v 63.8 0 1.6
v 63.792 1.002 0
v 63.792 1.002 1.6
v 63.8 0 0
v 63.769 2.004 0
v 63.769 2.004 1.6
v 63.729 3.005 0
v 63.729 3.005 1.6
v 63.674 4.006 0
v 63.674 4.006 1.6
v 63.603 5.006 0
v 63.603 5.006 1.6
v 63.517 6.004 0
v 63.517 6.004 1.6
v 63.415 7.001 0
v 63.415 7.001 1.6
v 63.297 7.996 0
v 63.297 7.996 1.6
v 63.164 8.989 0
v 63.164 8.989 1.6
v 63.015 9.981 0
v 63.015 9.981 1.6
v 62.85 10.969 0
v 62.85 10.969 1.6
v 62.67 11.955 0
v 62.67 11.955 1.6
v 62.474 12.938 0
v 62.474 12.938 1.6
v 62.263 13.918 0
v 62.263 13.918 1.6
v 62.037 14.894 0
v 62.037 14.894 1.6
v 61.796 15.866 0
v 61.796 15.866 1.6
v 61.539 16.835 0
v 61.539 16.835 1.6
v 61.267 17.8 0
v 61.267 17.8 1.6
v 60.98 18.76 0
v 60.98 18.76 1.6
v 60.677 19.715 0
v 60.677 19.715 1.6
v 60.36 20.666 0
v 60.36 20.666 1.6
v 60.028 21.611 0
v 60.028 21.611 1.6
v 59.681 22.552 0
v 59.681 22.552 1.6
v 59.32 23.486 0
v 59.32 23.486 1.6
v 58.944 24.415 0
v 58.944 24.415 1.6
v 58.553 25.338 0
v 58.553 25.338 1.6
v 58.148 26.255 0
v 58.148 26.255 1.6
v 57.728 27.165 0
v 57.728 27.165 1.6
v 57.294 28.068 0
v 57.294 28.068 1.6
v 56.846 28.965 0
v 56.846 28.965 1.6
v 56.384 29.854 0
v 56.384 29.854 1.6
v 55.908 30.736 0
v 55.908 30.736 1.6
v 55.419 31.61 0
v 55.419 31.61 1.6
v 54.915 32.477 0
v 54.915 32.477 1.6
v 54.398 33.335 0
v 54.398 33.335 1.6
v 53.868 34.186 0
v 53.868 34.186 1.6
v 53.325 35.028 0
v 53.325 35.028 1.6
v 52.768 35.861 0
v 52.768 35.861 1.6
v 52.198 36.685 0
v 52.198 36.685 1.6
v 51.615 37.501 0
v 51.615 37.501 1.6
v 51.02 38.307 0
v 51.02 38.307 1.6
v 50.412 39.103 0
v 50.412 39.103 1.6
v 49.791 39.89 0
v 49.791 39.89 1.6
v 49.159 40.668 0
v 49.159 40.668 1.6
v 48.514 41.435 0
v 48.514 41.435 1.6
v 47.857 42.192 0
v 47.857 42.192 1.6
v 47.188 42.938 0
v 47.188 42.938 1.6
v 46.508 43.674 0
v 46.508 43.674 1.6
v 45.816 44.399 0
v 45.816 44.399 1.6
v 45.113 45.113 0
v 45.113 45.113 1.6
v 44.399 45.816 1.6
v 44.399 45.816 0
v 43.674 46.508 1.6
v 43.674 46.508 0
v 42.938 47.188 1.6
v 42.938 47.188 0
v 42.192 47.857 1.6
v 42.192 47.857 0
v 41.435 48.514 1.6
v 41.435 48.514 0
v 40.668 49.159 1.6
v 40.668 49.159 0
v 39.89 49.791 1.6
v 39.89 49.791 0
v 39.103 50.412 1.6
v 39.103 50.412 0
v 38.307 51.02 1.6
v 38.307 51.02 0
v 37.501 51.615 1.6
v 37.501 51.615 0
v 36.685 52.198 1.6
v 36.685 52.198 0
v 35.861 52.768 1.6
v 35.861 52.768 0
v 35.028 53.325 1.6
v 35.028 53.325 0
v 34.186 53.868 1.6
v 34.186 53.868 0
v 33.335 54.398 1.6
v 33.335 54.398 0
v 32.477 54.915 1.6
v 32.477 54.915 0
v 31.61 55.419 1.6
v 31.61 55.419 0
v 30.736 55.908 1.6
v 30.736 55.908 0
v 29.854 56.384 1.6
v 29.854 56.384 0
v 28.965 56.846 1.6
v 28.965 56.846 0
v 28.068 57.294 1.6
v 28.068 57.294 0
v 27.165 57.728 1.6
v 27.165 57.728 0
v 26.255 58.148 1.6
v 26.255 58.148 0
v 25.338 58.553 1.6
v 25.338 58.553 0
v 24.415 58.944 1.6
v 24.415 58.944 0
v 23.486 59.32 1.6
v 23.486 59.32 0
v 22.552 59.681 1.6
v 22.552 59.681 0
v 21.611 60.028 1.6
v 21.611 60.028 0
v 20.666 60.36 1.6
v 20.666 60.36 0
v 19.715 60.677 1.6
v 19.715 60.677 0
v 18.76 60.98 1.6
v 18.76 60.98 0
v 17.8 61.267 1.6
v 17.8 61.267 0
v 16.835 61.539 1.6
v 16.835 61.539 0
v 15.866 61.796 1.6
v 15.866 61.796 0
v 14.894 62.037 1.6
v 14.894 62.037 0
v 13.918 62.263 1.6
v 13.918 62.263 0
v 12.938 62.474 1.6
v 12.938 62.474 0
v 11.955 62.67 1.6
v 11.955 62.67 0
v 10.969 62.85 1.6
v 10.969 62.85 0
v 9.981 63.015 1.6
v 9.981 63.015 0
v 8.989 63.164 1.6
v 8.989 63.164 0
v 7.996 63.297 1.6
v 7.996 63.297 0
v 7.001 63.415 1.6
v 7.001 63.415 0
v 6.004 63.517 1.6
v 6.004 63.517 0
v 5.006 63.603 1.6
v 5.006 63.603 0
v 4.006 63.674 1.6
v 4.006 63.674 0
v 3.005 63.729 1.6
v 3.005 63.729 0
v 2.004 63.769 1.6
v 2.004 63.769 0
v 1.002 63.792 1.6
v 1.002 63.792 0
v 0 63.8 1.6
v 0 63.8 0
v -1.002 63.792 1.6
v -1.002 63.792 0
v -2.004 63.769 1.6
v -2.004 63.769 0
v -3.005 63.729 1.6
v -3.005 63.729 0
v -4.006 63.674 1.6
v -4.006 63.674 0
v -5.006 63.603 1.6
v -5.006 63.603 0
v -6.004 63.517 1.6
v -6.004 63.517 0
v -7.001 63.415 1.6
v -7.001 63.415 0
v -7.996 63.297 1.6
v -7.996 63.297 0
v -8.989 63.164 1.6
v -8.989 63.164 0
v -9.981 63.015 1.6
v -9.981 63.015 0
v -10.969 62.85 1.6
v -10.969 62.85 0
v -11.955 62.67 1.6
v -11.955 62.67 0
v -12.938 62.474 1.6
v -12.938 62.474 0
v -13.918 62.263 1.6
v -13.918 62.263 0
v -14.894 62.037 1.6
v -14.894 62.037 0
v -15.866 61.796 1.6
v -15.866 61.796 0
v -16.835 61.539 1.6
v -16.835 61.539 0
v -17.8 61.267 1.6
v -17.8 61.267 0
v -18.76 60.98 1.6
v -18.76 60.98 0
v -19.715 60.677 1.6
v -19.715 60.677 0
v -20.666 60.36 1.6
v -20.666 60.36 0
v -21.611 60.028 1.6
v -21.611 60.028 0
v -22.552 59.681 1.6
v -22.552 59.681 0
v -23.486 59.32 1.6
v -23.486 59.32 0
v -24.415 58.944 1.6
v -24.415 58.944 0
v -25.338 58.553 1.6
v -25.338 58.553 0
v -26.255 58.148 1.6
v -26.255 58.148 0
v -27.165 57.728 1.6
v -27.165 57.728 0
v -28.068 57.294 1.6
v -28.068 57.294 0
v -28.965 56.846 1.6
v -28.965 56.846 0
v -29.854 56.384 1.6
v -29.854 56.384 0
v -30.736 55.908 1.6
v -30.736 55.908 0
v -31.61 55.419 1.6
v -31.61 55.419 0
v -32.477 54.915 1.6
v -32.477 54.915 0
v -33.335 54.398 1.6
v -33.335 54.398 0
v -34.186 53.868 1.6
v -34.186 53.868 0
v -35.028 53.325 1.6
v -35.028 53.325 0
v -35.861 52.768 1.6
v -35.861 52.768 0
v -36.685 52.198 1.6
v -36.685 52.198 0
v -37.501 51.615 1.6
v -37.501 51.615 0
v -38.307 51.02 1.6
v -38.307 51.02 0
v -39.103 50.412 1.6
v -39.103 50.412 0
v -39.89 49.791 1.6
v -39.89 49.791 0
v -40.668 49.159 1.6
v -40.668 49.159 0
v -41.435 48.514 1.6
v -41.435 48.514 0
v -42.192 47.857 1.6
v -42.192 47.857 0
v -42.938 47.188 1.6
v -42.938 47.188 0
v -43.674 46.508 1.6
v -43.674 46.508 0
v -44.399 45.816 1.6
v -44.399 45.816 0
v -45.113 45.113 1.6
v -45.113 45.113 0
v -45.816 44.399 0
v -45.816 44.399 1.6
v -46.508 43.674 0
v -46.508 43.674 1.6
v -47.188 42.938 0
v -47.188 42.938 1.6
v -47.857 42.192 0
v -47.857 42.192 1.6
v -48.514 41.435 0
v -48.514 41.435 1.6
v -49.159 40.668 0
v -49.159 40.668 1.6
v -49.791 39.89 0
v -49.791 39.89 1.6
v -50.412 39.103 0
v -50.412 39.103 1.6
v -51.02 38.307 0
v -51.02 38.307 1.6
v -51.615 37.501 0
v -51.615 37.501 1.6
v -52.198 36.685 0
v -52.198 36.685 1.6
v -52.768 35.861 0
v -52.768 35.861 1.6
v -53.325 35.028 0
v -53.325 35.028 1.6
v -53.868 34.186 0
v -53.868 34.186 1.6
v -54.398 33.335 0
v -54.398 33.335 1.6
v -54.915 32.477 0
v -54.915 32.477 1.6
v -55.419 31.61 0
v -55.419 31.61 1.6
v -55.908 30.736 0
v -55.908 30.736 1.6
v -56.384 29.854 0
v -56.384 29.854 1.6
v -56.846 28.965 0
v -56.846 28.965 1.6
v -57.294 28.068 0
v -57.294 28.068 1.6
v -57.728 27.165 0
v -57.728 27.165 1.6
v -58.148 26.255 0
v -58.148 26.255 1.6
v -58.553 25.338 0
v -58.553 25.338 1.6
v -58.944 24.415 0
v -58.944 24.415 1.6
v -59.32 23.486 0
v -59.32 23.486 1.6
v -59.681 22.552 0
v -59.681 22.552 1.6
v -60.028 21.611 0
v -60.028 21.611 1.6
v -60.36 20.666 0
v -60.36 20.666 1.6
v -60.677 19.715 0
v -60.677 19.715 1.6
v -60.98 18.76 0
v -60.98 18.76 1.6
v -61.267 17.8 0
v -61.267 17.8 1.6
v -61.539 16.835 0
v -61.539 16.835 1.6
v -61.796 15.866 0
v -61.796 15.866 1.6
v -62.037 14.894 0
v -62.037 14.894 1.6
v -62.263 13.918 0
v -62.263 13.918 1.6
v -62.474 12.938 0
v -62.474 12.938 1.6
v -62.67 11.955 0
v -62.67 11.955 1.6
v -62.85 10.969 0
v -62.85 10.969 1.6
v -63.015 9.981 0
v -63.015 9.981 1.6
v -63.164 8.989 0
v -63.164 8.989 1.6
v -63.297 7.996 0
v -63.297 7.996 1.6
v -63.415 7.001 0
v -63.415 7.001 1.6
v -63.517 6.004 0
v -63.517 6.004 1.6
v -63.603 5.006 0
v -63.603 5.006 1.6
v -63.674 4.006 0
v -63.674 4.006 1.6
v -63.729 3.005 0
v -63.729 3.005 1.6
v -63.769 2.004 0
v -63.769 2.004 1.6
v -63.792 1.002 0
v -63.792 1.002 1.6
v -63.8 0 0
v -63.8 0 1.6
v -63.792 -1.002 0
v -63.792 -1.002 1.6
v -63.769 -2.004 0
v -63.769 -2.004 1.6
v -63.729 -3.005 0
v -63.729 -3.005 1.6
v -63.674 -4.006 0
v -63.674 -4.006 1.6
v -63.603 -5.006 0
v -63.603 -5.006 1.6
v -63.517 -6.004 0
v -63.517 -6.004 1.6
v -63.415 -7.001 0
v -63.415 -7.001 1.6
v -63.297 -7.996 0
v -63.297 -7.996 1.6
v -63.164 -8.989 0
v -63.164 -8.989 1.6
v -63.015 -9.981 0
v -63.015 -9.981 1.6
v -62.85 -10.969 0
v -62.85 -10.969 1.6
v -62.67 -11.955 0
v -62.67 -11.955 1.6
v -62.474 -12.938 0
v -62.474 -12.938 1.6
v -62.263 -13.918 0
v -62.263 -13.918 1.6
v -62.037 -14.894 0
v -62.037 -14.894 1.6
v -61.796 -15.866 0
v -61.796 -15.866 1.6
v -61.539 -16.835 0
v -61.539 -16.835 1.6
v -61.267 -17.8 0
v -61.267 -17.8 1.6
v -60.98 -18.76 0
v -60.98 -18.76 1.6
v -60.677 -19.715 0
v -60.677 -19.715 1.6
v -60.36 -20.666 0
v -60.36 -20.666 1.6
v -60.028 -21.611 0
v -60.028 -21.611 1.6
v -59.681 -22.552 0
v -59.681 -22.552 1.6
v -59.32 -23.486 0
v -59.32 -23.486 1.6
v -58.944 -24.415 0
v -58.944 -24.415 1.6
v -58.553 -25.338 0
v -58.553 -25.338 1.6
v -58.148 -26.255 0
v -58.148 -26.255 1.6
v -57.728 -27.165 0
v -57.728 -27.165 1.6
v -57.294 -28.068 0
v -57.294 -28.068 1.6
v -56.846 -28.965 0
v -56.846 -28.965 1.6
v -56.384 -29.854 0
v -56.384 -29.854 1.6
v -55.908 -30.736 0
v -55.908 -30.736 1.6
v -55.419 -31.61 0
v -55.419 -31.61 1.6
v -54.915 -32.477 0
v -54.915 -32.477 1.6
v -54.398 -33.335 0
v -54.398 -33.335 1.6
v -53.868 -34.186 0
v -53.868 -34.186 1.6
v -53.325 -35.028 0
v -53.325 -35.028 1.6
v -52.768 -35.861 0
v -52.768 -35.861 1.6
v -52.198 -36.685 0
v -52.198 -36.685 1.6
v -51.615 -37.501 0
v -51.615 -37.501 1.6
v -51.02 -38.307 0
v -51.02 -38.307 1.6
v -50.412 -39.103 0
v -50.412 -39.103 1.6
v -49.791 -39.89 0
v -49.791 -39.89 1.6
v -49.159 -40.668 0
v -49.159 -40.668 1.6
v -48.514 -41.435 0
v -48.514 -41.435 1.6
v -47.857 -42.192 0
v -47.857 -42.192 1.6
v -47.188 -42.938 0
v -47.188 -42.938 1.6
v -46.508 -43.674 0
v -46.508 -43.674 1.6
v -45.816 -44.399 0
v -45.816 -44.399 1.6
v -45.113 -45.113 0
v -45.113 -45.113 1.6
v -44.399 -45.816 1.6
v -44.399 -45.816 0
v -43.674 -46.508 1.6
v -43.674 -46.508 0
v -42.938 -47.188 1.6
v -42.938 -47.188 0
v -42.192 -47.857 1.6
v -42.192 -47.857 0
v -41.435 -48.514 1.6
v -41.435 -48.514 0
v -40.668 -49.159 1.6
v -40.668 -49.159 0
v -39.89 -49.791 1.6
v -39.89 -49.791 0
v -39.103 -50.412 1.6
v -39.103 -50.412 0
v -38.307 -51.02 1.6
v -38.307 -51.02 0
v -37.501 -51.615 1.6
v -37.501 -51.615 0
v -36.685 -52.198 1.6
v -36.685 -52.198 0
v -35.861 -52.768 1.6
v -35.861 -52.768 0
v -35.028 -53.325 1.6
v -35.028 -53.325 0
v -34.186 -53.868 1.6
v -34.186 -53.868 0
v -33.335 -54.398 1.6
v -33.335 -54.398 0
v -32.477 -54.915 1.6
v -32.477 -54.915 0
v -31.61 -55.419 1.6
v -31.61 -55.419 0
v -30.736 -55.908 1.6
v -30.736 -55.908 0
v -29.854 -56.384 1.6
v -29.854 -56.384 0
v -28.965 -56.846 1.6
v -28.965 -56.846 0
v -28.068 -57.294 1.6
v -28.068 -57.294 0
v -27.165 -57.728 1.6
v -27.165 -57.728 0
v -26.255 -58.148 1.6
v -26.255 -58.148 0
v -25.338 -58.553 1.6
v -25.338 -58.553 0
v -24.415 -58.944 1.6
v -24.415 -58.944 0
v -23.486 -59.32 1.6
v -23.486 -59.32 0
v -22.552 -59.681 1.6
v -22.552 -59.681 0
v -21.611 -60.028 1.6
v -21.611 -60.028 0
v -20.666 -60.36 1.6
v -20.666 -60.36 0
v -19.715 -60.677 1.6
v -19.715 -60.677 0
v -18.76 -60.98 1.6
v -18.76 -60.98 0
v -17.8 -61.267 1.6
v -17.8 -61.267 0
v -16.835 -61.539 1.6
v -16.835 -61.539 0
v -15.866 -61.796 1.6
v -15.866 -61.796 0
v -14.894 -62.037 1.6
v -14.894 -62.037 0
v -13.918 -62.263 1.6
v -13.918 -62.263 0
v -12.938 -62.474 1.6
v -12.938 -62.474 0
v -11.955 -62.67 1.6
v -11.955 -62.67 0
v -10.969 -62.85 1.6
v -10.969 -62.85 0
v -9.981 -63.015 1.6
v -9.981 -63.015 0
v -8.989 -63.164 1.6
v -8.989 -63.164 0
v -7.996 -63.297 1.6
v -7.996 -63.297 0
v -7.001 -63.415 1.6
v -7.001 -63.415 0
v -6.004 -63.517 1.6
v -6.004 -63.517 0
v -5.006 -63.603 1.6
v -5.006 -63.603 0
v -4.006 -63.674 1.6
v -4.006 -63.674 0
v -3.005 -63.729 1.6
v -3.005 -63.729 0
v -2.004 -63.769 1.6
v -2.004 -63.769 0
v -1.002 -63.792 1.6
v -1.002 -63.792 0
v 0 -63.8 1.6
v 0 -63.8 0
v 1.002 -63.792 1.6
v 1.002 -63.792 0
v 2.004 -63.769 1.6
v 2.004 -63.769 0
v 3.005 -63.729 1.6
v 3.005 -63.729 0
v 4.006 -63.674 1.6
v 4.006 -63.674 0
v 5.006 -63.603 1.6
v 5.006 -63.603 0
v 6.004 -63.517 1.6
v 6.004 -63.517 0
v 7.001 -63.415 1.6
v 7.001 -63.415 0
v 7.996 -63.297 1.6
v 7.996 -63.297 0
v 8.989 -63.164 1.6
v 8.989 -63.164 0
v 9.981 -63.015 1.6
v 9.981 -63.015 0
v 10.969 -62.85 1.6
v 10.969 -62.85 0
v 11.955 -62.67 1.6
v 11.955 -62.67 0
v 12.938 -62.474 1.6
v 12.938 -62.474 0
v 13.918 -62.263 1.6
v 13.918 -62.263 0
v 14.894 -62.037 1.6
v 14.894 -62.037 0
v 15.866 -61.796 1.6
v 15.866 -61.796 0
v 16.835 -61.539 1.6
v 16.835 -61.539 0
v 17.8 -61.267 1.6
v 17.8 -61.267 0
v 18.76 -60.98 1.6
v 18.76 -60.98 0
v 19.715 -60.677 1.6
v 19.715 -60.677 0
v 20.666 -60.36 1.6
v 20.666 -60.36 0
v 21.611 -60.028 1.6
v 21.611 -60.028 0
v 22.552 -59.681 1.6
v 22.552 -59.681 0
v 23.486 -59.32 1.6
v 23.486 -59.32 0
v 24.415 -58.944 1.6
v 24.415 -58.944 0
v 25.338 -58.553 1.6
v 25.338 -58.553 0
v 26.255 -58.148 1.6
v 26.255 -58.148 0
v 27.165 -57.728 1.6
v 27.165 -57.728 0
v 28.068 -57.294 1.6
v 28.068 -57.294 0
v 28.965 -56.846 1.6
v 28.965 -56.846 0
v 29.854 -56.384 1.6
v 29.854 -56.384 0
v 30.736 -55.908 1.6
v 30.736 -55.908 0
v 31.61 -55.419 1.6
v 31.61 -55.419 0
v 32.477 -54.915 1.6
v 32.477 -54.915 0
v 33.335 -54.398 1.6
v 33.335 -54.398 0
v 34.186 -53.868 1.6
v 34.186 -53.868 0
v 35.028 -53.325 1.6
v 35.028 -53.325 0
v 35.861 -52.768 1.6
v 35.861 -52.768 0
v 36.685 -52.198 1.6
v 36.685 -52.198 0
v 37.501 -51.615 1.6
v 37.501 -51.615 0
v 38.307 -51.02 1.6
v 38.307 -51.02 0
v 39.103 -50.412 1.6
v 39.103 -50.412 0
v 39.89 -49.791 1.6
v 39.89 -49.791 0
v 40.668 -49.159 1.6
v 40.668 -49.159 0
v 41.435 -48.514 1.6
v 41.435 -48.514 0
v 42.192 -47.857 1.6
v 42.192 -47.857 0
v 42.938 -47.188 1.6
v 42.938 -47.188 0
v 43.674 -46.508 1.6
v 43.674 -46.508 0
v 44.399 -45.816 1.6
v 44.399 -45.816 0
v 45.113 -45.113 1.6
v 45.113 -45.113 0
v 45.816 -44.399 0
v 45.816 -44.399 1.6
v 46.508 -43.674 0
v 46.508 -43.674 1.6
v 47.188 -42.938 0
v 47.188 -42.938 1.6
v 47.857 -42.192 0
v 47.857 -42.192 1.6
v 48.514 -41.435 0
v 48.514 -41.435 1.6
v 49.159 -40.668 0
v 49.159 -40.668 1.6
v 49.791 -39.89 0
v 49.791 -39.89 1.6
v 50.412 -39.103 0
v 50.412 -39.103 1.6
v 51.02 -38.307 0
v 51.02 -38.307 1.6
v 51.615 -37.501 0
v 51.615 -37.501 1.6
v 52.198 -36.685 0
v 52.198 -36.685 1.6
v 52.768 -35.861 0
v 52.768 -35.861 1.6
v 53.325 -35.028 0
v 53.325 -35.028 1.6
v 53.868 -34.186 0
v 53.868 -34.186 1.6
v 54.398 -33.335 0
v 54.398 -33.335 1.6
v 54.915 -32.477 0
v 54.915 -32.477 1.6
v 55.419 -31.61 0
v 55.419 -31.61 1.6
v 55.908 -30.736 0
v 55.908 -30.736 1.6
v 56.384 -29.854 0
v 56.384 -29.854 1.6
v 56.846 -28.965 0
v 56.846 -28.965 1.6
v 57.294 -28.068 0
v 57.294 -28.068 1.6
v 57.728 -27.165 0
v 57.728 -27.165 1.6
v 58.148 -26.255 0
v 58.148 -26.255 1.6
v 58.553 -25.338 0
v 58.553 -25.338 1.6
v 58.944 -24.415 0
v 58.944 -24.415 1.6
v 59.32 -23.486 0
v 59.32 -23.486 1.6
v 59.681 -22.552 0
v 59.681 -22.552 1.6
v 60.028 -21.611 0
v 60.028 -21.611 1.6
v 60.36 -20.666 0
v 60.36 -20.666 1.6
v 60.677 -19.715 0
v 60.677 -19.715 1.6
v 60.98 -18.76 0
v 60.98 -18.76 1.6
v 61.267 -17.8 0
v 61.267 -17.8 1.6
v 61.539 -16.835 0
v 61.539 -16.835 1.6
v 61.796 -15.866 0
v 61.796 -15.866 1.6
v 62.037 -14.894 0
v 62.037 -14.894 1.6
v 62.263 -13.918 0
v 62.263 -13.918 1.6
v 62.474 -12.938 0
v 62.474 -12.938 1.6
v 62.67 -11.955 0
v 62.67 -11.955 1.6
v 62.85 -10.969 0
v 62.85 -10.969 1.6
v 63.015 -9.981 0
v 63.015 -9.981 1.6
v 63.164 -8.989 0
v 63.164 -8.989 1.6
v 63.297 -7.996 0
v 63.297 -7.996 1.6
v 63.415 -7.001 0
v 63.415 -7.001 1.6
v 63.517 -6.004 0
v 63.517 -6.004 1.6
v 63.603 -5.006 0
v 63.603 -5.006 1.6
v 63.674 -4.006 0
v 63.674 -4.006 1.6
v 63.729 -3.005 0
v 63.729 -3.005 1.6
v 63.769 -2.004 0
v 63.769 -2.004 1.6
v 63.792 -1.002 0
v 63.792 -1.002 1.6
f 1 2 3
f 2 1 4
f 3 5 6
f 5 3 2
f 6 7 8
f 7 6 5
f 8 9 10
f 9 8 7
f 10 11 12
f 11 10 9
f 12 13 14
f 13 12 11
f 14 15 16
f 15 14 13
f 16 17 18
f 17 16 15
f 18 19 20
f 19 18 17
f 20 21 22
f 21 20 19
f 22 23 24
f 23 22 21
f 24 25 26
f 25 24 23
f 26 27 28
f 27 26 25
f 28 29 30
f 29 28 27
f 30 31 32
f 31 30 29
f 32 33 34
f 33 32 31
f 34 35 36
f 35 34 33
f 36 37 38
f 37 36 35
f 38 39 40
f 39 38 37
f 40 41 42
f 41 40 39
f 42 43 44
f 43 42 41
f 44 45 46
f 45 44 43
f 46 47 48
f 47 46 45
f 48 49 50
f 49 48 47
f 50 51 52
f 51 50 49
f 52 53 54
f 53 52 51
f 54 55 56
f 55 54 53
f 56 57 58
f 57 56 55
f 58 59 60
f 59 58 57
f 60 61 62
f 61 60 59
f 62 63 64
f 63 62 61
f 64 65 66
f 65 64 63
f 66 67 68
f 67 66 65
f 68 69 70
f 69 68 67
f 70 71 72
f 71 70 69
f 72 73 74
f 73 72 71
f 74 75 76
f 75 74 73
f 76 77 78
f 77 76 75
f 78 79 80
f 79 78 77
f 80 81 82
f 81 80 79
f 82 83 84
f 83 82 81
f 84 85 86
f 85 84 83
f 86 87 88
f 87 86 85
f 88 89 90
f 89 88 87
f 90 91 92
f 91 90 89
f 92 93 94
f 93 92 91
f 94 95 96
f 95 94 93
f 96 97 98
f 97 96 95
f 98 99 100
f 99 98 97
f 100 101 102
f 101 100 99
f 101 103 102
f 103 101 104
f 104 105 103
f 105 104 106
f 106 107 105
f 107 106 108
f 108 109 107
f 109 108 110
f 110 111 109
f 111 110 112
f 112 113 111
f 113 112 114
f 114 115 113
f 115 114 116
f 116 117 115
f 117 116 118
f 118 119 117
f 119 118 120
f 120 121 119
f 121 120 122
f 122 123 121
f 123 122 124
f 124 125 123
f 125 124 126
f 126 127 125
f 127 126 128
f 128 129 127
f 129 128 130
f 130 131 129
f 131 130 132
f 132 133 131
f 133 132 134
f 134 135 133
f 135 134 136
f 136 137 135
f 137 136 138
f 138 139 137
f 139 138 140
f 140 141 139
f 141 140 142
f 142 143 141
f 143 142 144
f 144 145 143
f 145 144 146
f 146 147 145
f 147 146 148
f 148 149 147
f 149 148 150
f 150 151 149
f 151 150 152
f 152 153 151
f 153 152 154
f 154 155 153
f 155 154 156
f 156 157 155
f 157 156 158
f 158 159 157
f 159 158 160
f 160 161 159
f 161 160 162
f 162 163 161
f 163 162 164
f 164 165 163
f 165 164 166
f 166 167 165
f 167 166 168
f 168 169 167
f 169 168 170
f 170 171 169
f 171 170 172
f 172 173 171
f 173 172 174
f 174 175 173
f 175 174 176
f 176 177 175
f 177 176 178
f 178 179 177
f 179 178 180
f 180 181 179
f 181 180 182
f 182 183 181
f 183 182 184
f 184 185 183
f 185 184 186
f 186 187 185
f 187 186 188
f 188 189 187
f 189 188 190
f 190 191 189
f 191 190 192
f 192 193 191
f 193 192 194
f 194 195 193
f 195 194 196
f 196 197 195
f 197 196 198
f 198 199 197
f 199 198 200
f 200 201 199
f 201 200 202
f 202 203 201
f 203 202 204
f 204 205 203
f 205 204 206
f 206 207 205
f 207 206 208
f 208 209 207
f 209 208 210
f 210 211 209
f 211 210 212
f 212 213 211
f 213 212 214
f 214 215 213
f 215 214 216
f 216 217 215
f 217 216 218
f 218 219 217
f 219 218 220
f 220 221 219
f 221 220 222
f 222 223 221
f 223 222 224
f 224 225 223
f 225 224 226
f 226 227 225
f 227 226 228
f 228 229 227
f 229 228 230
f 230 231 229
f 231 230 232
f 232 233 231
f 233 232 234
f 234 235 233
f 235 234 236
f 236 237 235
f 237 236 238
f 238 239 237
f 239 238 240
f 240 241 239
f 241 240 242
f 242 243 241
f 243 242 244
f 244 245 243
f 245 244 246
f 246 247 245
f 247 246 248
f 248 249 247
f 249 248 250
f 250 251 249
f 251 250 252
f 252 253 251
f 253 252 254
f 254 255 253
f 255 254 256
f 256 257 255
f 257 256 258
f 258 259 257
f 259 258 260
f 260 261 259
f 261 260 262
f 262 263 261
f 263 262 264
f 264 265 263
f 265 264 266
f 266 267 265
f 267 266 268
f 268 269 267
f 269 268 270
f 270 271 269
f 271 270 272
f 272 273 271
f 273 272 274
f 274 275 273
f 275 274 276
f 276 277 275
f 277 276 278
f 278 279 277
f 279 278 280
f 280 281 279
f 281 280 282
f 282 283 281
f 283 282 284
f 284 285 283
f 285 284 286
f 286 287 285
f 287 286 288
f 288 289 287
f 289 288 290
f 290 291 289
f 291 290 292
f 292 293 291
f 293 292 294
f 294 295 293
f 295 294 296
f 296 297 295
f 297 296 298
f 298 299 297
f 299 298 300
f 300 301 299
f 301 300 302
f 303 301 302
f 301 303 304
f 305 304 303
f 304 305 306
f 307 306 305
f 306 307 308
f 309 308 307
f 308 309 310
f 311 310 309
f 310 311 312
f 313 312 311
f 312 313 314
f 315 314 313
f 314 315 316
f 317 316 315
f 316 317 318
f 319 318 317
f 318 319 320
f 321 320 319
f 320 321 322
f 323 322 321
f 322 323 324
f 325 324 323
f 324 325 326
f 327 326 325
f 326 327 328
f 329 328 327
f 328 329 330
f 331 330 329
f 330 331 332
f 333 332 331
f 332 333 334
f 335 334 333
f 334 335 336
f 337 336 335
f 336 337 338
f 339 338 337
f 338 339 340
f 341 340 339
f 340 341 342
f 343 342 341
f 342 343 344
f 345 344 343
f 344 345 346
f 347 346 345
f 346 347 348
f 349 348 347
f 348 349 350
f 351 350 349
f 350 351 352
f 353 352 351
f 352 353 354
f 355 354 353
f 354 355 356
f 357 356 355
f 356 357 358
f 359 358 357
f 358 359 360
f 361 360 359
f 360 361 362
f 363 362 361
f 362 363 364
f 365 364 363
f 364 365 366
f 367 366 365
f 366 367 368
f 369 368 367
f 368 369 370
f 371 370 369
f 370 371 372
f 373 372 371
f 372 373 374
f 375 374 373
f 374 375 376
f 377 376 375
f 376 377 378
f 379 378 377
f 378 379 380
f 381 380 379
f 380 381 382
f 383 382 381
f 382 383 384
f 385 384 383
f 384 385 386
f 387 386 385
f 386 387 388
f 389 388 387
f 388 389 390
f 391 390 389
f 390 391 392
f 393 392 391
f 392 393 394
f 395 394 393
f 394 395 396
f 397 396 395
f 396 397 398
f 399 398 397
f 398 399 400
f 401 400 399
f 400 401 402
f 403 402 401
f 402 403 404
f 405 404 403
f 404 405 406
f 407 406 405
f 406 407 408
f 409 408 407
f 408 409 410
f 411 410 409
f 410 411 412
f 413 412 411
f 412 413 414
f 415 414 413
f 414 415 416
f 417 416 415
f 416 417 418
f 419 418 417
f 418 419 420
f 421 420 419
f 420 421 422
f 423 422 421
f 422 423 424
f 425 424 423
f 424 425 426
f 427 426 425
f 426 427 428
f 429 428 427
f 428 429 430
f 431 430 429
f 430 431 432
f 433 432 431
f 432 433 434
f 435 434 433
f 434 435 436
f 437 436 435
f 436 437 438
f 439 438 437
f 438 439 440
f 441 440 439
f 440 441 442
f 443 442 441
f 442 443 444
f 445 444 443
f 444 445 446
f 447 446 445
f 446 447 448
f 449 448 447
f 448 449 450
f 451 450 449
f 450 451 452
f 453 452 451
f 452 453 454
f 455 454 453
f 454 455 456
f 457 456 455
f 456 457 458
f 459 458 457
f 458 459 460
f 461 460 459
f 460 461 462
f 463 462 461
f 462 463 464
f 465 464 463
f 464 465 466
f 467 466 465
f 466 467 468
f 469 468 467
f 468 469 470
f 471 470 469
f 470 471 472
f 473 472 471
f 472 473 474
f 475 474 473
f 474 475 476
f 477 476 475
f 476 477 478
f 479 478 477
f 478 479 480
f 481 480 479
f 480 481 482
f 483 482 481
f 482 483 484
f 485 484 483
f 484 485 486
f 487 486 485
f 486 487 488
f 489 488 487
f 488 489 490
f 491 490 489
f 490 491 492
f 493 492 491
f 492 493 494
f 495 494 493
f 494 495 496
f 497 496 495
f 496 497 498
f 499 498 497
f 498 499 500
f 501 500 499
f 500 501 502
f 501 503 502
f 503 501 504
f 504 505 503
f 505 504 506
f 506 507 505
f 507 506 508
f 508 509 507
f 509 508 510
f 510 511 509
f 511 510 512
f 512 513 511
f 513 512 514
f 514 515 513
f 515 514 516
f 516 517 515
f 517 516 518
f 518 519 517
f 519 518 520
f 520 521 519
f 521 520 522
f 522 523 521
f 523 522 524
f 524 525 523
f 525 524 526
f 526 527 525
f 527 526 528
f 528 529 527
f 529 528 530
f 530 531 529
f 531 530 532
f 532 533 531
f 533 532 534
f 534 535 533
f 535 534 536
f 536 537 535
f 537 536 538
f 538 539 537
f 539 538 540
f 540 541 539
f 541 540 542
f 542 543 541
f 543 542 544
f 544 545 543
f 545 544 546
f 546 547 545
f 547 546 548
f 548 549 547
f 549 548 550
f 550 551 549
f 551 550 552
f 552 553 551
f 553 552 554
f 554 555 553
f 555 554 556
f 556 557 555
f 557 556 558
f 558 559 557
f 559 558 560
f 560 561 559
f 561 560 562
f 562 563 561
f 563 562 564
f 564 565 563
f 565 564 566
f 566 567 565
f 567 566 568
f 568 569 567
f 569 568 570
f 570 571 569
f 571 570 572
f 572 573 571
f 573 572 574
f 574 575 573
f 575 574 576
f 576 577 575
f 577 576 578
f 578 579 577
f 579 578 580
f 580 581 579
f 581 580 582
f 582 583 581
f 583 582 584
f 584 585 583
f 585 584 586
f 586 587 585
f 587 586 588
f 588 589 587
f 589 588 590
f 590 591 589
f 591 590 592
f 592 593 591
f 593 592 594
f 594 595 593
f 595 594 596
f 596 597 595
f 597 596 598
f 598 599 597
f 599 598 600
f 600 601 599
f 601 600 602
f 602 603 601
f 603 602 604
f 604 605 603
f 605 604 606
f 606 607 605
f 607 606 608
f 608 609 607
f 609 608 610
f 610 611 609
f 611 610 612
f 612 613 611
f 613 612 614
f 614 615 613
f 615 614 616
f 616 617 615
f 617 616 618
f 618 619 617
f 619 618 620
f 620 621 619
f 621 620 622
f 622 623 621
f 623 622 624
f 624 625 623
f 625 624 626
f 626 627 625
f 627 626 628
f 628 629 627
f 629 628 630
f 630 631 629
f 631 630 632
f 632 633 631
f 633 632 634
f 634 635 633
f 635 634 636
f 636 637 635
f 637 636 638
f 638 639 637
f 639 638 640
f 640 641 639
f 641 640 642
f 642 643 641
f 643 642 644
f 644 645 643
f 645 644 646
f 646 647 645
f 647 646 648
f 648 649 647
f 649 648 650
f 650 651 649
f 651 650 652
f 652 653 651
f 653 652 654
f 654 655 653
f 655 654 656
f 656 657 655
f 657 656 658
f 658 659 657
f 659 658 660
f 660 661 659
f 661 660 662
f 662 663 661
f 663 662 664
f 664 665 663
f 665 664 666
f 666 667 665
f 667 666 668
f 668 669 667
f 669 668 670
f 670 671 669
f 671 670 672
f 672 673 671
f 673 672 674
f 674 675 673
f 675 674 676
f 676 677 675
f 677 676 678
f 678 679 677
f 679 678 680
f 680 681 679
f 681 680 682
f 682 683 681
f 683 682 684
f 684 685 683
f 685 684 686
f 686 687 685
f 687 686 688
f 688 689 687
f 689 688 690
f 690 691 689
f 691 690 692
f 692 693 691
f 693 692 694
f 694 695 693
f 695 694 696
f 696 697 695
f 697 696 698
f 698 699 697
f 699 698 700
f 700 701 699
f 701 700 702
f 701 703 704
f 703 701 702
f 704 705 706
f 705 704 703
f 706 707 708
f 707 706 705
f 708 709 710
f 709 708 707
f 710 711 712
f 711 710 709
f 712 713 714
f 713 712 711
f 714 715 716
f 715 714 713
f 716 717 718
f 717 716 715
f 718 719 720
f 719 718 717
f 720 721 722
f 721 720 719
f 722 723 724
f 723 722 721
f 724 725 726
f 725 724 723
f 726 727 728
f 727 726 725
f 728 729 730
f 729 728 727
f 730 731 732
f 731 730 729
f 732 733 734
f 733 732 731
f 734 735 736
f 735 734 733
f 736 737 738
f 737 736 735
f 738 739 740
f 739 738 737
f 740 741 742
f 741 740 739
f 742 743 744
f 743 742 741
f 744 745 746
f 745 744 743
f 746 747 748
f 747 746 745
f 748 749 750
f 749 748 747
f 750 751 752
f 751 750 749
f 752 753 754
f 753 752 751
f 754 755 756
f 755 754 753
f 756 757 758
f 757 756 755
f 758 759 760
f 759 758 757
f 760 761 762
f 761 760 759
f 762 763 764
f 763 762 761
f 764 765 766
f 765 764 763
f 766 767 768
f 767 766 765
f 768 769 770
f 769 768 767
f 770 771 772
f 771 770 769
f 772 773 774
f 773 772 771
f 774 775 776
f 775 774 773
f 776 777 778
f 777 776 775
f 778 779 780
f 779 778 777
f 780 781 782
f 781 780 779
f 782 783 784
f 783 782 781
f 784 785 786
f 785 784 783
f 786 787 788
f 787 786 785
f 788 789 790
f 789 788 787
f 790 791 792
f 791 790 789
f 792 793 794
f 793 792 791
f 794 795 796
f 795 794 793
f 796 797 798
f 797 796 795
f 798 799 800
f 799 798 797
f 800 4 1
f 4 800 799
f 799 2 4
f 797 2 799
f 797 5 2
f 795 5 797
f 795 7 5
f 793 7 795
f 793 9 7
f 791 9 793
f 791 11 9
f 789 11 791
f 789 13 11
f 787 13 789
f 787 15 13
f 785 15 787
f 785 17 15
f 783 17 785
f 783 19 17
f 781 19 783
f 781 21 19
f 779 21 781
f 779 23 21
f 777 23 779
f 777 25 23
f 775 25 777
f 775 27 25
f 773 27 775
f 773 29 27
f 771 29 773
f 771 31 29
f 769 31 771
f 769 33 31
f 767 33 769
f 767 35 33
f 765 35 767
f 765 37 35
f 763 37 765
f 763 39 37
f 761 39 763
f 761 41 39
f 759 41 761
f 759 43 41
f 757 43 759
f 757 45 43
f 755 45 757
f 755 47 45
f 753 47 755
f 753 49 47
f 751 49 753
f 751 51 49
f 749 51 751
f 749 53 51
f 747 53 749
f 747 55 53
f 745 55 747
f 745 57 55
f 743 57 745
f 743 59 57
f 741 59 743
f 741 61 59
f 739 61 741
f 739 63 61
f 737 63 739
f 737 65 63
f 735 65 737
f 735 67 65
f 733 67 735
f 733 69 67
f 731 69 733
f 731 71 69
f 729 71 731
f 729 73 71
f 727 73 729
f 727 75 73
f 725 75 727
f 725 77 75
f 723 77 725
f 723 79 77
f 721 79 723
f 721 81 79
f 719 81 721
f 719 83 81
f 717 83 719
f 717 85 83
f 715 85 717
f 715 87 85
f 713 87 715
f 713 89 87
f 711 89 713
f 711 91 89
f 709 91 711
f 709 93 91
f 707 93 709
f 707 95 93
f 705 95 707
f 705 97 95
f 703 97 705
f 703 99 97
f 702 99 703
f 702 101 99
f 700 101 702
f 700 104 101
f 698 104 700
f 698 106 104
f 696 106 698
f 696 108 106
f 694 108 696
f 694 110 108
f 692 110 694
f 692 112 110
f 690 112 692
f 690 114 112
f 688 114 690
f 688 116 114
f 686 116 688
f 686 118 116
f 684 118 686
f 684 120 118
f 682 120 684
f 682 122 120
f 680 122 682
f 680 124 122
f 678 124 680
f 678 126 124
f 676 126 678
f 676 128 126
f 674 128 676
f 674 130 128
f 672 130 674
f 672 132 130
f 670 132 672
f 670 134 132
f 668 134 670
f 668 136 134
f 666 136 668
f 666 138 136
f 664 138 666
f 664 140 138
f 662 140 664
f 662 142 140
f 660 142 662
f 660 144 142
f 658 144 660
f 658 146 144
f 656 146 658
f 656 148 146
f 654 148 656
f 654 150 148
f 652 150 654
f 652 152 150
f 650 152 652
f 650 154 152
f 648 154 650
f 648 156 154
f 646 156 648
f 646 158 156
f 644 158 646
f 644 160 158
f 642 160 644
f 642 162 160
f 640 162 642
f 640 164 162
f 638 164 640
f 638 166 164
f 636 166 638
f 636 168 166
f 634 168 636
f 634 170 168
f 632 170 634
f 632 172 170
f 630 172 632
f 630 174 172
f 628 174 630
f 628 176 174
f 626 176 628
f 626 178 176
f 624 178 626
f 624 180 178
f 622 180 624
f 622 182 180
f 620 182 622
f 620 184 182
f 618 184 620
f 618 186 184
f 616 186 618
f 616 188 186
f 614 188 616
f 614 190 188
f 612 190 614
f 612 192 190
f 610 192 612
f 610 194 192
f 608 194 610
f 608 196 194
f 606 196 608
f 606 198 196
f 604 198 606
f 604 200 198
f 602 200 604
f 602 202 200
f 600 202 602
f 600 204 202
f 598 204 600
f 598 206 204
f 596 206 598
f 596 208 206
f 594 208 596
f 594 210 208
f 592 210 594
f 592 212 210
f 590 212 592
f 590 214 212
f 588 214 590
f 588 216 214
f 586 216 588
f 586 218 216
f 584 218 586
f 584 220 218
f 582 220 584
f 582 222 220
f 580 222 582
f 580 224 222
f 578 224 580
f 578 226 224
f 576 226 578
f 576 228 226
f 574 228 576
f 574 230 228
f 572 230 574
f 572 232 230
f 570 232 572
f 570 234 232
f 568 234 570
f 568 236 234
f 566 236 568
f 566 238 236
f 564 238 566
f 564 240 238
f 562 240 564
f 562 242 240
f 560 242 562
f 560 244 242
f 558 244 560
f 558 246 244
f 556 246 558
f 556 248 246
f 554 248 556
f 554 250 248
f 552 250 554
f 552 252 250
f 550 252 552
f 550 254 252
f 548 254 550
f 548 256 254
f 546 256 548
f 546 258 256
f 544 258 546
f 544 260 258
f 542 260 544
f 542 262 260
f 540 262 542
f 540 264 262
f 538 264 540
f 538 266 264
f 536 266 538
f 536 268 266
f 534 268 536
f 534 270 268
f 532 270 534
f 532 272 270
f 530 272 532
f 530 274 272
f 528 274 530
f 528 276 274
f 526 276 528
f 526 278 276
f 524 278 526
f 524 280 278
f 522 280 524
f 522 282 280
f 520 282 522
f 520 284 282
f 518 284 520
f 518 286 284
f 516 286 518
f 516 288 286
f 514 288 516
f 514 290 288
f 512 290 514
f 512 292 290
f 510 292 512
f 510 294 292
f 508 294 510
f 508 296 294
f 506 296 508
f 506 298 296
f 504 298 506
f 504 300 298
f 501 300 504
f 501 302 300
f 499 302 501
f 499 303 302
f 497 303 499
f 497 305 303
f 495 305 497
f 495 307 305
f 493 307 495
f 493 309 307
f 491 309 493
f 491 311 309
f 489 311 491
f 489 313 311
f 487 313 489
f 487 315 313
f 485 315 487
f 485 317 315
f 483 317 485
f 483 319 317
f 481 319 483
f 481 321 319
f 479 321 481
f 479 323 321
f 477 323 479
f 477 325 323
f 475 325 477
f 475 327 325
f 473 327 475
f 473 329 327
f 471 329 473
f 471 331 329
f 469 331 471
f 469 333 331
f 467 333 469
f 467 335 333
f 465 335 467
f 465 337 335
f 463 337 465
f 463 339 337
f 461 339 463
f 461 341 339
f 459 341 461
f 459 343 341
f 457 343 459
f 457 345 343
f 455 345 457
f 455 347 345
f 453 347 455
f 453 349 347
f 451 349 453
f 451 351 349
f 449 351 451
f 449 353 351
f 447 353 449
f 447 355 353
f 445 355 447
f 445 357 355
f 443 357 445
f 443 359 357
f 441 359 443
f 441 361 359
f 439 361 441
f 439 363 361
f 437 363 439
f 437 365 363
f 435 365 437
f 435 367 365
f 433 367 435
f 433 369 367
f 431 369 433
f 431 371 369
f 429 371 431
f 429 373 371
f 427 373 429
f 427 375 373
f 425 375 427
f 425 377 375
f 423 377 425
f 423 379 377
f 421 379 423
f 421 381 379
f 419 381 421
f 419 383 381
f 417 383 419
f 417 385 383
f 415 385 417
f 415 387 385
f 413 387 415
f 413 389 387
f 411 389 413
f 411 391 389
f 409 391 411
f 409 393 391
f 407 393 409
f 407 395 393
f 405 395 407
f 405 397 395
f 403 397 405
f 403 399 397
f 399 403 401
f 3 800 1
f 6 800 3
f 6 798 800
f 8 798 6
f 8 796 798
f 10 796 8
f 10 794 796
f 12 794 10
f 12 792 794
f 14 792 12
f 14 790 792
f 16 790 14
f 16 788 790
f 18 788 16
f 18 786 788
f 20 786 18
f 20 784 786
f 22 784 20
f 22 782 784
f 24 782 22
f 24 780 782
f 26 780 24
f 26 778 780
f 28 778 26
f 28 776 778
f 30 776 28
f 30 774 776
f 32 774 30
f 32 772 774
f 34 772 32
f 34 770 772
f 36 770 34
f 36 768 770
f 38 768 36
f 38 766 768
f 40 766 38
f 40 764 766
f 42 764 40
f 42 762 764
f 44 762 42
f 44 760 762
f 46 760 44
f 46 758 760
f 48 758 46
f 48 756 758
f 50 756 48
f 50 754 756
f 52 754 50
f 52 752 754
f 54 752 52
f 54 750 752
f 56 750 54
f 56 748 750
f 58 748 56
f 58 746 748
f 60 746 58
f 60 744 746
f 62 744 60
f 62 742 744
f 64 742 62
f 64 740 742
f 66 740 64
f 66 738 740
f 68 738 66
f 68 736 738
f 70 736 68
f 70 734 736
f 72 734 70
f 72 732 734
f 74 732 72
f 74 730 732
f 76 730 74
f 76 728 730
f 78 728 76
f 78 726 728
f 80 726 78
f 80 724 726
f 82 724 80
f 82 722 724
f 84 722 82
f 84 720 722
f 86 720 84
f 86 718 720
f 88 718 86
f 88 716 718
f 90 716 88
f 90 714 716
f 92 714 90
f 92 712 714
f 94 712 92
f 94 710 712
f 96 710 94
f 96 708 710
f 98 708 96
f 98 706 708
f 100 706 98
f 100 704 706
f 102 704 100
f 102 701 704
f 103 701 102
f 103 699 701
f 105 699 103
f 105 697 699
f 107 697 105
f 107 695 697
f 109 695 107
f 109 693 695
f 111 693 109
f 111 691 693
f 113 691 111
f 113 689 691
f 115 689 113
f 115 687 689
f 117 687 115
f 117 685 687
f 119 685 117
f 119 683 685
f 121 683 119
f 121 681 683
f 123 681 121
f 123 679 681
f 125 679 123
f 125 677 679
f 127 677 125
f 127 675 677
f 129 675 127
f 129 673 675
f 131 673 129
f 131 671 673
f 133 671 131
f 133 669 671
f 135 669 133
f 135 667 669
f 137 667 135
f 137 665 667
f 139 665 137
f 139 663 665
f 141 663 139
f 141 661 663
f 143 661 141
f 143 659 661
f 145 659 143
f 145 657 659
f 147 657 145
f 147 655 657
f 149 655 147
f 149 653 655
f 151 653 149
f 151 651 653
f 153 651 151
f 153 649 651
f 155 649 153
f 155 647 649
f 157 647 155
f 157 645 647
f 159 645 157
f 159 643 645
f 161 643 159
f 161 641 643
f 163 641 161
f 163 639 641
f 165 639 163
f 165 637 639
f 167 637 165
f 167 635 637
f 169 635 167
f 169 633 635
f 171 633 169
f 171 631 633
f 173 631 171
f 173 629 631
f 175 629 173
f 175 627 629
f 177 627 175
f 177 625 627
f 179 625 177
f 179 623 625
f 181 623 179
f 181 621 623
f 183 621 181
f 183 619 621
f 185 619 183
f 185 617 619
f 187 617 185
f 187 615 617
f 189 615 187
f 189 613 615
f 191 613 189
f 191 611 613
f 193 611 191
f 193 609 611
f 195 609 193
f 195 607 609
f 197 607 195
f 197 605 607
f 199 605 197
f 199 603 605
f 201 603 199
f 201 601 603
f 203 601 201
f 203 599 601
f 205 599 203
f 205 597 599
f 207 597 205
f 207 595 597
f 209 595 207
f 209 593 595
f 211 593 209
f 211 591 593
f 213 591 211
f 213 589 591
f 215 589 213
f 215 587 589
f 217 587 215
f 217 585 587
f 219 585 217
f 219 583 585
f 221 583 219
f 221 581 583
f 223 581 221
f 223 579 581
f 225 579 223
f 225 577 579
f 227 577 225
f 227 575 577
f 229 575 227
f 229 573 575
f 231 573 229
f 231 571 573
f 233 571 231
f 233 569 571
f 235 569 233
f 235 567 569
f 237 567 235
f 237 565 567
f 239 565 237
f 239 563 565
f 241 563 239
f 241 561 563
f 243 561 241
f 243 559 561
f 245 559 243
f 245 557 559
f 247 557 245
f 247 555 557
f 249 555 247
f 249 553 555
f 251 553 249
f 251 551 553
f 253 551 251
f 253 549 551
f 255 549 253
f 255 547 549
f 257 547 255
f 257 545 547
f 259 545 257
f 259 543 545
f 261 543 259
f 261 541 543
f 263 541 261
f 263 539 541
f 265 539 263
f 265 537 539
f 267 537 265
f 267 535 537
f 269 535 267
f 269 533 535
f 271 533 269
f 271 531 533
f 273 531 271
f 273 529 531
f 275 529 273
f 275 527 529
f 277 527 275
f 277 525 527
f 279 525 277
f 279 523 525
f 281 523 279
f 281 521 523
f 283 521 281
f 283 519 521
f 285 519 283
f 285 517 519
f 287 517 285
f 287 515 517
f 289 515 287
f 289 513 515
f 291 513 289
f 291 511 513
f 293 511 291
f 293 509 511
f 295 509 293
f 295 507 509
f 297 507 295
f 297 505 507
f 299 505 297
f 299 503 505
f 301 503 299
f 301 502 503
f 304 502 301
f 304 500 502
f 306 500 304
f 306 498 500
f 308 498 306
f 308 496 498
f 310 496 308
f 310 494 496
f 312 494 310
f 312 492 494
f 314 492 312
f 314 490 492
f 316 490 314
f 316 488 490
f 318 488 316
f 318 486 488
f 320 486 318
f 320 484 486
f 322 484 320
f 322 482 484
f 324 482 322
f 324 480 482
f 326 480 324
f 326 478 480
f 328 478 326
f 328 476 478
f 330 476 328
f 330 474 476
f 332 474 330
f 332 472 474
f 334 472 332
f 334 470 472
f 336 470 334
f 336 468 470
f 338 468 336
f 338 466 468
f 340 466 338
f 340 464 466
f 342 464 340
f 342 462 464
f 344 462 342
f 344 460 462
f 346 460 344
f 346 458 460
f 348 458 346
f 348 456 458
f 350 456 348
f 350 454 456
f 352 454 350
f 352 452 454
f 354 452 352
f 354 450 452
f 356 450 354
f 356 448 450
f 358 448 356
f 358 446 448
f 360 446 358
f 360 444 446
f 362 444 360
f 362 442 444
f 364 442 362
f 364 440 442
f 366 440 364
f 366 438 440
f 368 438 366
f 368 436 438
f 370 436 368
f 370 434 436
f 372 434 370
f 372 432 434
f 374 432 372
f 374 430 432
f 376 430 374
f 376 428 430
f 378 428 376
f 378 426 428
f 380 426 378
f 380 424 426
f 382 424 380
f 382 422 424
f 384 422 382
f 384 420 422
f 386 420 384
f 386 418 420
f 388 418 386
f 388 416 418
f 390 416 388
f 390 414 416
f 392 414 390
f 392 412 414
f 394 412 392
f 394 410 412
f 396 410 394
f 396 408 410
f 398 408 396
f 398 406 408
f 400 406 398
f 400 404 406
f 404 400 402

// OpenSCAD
$fn=400;

// Printer ist set to top/bottom thickness of 0.8. Use this factor to get massive plates
ecp_plate_height=1.6;
ecp_dia=140;
ecp_material_size=3;


difference() {
    cylinder(ecp_plate_height, ecp_dia/2-ecp_material_size*2-0.2, ecp_dia/2-ecp_material_size*2-0.2);
}
